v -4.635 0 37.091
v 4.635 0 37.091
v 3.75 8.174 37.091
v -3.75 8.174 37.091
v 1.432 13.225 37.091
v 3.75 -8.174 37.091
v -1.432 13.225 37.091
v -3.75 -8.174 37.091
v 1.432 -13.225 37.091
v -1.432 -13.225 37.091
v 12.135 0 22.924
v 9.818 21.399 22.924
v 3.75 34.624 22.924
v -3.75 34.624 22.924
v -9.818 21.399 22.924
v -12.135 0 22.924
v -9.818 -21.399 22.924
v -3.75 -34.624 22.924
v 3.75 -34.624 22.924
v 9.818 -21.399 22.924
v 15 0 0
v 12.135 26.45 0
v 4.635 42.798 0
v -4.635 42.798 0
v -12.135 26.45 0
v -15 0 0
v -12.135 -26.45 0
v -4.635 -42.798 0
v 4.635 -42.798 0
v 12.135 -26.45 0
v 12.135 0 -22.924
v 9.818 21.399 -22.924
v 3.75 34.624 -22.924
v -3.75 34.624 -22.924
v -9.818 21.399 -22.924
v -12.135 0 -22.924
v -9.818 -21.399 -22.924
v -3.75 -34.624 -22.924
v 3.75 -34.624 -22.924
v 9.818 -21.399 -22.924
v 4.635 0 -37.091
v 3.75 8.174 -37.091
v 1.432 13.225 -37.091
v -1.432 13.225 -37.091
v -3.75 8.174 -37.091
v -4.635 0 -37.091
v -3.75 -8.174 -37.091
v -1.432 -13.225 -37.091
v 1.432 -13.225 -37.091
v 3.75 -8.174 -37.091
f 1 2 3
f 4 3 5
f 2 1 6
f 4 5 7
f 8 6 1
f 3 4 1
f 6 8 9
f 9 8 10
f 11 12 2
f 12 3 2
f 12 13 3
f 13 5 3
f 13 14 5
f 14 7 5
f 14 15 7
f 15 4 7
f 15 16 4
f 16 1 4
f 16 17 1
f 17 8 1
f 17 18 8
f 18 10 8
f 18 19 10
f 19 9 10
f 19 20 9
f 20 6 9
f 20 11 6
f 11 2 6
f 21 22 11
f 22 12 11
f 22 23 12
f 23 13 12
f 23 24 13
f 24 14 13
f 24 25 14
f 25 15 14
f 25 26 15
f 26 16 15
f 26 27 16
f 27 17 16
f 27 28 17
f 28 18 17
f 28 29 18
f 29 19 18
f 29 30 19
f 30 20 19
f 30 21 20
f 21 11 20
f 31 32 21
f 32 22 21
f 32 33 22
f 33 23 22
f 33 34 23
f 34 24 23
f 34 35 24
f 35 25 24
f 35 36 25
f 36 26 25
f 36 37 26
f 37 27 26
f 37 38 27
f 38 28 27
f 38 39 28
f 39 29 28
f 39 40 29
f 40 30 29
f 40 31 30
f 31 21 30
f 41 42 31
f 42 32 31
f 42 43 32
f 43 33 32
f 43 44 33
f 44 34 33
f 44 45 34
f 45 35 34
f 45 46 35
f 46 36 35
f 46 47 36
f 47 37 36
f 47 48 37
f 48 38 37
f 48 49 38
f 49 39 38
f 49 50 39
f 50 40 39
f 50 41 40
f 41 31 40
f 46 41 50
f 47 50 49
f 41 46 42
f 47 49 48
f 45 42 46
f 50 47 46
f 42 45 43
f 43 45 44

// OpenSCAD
// Generated by SolidPython 1.0.1 on 2020-07-29 00:46:46


scale(v = [5, 15, 13]) {
	sphere(r = 3);
}
/***********************************************
*********      SolidPython code:      **********
************************************************
 
# import packages: SolidPython
from solid import *
from solid.utils import *
from itertools import chain, combinations, permutations


class Resize:

    def __init__(self, scad_file):
        self.scad_file = scad_file
        #self.scad_file = import_scad(scad_file)
        # cone/cylinder param:
        self.r1 = 0
        self.r2 = 0
        self.h = 0
        # rectangular prism param:
        self.w = 0
        self.l = 0
        # ellipse param:
        self.r = 0

    # import OpenScad code (file name corresponds to shape)


    # classify shape + parameters
    def assign(self, param1, param2, param3):
        if self.scad_file == 'cone.scad':
            self.r1 = param1
            self.r2 = param2
            self.h = param3
        elif self.scad_file == 'cylinder.scad':
            self.r1 = param1
            self.r2 = param2
            self.h = param3
        elif self.scad_file == 'rectangularPrism.scad':
            self.h = param1
            self.l = param2
            self.w = param3
        else:
            self.r = param1
            self.h = param2

    # resize parameters
    def iterate(self):
        x = range(3, 20, 2)
        i = 1
        if self.scad_file == 'cone.scad':
            tempList = list(permutations(x, 2))
            for temp in tempList:
                param1 = temp[0]
                param2 = temp[1]
                filepath = 'produced_scad_files/' + 'cone' + str(param1) + '_' + str(param2) + '_' + '.scad'
                scad_render_to_file(cylinder(h=param1, r1=param2, r2=0), filepath)

        elif self.scad_file == 'cylinder.scad':
            tempList = list(permutations(x, 3))
            for temp in tempList:
                param1 = temp[0]
                param2 = temp[1]
                filepath = 'produced_scad_files/' + 'cylinder' + str(param1) + '_' + str(param2) + '_' + '.scad'
                scad_render_to_file(cylinder(h=param1, r1=param2, r2=param2), filepath)

        elif self.scad_file == 'rectangularPrism.scad':
            tempList = list(permutations(x, 3))
            for temp in tempList:
                param1 = temp[0]
                param2 = temp[1]
                param3 = temp[2]
                filepath = 'produced_scad_files/' + 'rectangularPrism' + str(param1) + '_' + str(param2) + '_' + str(
                    param3) + '.scad'
                scad_render_to_file(cube(size=(param1, param2, param3)), filepath)

        elif self.scad_file == 'ellipse.scad':
            tempList = list(permutations(x, 4))
            for temp in tempList:
                param1 = temp[0]
                param2 = temp[1]
                param3 = temp[2]
                param4 = temp[3]
                filepath = 'produced_scad_files/' + 'ellipse' + str(param1) + '_' + str(param2) + '_' + str(param3) + '_' + str(param4) + '.scad'
                scad_render_to_file(scale([param1, param2, param3])(sphere(r=param4)), filepath)

    def render_to_scadfile(self):
        scad_render_to_file(scad, 'example.scad') 
 
************************************************/
